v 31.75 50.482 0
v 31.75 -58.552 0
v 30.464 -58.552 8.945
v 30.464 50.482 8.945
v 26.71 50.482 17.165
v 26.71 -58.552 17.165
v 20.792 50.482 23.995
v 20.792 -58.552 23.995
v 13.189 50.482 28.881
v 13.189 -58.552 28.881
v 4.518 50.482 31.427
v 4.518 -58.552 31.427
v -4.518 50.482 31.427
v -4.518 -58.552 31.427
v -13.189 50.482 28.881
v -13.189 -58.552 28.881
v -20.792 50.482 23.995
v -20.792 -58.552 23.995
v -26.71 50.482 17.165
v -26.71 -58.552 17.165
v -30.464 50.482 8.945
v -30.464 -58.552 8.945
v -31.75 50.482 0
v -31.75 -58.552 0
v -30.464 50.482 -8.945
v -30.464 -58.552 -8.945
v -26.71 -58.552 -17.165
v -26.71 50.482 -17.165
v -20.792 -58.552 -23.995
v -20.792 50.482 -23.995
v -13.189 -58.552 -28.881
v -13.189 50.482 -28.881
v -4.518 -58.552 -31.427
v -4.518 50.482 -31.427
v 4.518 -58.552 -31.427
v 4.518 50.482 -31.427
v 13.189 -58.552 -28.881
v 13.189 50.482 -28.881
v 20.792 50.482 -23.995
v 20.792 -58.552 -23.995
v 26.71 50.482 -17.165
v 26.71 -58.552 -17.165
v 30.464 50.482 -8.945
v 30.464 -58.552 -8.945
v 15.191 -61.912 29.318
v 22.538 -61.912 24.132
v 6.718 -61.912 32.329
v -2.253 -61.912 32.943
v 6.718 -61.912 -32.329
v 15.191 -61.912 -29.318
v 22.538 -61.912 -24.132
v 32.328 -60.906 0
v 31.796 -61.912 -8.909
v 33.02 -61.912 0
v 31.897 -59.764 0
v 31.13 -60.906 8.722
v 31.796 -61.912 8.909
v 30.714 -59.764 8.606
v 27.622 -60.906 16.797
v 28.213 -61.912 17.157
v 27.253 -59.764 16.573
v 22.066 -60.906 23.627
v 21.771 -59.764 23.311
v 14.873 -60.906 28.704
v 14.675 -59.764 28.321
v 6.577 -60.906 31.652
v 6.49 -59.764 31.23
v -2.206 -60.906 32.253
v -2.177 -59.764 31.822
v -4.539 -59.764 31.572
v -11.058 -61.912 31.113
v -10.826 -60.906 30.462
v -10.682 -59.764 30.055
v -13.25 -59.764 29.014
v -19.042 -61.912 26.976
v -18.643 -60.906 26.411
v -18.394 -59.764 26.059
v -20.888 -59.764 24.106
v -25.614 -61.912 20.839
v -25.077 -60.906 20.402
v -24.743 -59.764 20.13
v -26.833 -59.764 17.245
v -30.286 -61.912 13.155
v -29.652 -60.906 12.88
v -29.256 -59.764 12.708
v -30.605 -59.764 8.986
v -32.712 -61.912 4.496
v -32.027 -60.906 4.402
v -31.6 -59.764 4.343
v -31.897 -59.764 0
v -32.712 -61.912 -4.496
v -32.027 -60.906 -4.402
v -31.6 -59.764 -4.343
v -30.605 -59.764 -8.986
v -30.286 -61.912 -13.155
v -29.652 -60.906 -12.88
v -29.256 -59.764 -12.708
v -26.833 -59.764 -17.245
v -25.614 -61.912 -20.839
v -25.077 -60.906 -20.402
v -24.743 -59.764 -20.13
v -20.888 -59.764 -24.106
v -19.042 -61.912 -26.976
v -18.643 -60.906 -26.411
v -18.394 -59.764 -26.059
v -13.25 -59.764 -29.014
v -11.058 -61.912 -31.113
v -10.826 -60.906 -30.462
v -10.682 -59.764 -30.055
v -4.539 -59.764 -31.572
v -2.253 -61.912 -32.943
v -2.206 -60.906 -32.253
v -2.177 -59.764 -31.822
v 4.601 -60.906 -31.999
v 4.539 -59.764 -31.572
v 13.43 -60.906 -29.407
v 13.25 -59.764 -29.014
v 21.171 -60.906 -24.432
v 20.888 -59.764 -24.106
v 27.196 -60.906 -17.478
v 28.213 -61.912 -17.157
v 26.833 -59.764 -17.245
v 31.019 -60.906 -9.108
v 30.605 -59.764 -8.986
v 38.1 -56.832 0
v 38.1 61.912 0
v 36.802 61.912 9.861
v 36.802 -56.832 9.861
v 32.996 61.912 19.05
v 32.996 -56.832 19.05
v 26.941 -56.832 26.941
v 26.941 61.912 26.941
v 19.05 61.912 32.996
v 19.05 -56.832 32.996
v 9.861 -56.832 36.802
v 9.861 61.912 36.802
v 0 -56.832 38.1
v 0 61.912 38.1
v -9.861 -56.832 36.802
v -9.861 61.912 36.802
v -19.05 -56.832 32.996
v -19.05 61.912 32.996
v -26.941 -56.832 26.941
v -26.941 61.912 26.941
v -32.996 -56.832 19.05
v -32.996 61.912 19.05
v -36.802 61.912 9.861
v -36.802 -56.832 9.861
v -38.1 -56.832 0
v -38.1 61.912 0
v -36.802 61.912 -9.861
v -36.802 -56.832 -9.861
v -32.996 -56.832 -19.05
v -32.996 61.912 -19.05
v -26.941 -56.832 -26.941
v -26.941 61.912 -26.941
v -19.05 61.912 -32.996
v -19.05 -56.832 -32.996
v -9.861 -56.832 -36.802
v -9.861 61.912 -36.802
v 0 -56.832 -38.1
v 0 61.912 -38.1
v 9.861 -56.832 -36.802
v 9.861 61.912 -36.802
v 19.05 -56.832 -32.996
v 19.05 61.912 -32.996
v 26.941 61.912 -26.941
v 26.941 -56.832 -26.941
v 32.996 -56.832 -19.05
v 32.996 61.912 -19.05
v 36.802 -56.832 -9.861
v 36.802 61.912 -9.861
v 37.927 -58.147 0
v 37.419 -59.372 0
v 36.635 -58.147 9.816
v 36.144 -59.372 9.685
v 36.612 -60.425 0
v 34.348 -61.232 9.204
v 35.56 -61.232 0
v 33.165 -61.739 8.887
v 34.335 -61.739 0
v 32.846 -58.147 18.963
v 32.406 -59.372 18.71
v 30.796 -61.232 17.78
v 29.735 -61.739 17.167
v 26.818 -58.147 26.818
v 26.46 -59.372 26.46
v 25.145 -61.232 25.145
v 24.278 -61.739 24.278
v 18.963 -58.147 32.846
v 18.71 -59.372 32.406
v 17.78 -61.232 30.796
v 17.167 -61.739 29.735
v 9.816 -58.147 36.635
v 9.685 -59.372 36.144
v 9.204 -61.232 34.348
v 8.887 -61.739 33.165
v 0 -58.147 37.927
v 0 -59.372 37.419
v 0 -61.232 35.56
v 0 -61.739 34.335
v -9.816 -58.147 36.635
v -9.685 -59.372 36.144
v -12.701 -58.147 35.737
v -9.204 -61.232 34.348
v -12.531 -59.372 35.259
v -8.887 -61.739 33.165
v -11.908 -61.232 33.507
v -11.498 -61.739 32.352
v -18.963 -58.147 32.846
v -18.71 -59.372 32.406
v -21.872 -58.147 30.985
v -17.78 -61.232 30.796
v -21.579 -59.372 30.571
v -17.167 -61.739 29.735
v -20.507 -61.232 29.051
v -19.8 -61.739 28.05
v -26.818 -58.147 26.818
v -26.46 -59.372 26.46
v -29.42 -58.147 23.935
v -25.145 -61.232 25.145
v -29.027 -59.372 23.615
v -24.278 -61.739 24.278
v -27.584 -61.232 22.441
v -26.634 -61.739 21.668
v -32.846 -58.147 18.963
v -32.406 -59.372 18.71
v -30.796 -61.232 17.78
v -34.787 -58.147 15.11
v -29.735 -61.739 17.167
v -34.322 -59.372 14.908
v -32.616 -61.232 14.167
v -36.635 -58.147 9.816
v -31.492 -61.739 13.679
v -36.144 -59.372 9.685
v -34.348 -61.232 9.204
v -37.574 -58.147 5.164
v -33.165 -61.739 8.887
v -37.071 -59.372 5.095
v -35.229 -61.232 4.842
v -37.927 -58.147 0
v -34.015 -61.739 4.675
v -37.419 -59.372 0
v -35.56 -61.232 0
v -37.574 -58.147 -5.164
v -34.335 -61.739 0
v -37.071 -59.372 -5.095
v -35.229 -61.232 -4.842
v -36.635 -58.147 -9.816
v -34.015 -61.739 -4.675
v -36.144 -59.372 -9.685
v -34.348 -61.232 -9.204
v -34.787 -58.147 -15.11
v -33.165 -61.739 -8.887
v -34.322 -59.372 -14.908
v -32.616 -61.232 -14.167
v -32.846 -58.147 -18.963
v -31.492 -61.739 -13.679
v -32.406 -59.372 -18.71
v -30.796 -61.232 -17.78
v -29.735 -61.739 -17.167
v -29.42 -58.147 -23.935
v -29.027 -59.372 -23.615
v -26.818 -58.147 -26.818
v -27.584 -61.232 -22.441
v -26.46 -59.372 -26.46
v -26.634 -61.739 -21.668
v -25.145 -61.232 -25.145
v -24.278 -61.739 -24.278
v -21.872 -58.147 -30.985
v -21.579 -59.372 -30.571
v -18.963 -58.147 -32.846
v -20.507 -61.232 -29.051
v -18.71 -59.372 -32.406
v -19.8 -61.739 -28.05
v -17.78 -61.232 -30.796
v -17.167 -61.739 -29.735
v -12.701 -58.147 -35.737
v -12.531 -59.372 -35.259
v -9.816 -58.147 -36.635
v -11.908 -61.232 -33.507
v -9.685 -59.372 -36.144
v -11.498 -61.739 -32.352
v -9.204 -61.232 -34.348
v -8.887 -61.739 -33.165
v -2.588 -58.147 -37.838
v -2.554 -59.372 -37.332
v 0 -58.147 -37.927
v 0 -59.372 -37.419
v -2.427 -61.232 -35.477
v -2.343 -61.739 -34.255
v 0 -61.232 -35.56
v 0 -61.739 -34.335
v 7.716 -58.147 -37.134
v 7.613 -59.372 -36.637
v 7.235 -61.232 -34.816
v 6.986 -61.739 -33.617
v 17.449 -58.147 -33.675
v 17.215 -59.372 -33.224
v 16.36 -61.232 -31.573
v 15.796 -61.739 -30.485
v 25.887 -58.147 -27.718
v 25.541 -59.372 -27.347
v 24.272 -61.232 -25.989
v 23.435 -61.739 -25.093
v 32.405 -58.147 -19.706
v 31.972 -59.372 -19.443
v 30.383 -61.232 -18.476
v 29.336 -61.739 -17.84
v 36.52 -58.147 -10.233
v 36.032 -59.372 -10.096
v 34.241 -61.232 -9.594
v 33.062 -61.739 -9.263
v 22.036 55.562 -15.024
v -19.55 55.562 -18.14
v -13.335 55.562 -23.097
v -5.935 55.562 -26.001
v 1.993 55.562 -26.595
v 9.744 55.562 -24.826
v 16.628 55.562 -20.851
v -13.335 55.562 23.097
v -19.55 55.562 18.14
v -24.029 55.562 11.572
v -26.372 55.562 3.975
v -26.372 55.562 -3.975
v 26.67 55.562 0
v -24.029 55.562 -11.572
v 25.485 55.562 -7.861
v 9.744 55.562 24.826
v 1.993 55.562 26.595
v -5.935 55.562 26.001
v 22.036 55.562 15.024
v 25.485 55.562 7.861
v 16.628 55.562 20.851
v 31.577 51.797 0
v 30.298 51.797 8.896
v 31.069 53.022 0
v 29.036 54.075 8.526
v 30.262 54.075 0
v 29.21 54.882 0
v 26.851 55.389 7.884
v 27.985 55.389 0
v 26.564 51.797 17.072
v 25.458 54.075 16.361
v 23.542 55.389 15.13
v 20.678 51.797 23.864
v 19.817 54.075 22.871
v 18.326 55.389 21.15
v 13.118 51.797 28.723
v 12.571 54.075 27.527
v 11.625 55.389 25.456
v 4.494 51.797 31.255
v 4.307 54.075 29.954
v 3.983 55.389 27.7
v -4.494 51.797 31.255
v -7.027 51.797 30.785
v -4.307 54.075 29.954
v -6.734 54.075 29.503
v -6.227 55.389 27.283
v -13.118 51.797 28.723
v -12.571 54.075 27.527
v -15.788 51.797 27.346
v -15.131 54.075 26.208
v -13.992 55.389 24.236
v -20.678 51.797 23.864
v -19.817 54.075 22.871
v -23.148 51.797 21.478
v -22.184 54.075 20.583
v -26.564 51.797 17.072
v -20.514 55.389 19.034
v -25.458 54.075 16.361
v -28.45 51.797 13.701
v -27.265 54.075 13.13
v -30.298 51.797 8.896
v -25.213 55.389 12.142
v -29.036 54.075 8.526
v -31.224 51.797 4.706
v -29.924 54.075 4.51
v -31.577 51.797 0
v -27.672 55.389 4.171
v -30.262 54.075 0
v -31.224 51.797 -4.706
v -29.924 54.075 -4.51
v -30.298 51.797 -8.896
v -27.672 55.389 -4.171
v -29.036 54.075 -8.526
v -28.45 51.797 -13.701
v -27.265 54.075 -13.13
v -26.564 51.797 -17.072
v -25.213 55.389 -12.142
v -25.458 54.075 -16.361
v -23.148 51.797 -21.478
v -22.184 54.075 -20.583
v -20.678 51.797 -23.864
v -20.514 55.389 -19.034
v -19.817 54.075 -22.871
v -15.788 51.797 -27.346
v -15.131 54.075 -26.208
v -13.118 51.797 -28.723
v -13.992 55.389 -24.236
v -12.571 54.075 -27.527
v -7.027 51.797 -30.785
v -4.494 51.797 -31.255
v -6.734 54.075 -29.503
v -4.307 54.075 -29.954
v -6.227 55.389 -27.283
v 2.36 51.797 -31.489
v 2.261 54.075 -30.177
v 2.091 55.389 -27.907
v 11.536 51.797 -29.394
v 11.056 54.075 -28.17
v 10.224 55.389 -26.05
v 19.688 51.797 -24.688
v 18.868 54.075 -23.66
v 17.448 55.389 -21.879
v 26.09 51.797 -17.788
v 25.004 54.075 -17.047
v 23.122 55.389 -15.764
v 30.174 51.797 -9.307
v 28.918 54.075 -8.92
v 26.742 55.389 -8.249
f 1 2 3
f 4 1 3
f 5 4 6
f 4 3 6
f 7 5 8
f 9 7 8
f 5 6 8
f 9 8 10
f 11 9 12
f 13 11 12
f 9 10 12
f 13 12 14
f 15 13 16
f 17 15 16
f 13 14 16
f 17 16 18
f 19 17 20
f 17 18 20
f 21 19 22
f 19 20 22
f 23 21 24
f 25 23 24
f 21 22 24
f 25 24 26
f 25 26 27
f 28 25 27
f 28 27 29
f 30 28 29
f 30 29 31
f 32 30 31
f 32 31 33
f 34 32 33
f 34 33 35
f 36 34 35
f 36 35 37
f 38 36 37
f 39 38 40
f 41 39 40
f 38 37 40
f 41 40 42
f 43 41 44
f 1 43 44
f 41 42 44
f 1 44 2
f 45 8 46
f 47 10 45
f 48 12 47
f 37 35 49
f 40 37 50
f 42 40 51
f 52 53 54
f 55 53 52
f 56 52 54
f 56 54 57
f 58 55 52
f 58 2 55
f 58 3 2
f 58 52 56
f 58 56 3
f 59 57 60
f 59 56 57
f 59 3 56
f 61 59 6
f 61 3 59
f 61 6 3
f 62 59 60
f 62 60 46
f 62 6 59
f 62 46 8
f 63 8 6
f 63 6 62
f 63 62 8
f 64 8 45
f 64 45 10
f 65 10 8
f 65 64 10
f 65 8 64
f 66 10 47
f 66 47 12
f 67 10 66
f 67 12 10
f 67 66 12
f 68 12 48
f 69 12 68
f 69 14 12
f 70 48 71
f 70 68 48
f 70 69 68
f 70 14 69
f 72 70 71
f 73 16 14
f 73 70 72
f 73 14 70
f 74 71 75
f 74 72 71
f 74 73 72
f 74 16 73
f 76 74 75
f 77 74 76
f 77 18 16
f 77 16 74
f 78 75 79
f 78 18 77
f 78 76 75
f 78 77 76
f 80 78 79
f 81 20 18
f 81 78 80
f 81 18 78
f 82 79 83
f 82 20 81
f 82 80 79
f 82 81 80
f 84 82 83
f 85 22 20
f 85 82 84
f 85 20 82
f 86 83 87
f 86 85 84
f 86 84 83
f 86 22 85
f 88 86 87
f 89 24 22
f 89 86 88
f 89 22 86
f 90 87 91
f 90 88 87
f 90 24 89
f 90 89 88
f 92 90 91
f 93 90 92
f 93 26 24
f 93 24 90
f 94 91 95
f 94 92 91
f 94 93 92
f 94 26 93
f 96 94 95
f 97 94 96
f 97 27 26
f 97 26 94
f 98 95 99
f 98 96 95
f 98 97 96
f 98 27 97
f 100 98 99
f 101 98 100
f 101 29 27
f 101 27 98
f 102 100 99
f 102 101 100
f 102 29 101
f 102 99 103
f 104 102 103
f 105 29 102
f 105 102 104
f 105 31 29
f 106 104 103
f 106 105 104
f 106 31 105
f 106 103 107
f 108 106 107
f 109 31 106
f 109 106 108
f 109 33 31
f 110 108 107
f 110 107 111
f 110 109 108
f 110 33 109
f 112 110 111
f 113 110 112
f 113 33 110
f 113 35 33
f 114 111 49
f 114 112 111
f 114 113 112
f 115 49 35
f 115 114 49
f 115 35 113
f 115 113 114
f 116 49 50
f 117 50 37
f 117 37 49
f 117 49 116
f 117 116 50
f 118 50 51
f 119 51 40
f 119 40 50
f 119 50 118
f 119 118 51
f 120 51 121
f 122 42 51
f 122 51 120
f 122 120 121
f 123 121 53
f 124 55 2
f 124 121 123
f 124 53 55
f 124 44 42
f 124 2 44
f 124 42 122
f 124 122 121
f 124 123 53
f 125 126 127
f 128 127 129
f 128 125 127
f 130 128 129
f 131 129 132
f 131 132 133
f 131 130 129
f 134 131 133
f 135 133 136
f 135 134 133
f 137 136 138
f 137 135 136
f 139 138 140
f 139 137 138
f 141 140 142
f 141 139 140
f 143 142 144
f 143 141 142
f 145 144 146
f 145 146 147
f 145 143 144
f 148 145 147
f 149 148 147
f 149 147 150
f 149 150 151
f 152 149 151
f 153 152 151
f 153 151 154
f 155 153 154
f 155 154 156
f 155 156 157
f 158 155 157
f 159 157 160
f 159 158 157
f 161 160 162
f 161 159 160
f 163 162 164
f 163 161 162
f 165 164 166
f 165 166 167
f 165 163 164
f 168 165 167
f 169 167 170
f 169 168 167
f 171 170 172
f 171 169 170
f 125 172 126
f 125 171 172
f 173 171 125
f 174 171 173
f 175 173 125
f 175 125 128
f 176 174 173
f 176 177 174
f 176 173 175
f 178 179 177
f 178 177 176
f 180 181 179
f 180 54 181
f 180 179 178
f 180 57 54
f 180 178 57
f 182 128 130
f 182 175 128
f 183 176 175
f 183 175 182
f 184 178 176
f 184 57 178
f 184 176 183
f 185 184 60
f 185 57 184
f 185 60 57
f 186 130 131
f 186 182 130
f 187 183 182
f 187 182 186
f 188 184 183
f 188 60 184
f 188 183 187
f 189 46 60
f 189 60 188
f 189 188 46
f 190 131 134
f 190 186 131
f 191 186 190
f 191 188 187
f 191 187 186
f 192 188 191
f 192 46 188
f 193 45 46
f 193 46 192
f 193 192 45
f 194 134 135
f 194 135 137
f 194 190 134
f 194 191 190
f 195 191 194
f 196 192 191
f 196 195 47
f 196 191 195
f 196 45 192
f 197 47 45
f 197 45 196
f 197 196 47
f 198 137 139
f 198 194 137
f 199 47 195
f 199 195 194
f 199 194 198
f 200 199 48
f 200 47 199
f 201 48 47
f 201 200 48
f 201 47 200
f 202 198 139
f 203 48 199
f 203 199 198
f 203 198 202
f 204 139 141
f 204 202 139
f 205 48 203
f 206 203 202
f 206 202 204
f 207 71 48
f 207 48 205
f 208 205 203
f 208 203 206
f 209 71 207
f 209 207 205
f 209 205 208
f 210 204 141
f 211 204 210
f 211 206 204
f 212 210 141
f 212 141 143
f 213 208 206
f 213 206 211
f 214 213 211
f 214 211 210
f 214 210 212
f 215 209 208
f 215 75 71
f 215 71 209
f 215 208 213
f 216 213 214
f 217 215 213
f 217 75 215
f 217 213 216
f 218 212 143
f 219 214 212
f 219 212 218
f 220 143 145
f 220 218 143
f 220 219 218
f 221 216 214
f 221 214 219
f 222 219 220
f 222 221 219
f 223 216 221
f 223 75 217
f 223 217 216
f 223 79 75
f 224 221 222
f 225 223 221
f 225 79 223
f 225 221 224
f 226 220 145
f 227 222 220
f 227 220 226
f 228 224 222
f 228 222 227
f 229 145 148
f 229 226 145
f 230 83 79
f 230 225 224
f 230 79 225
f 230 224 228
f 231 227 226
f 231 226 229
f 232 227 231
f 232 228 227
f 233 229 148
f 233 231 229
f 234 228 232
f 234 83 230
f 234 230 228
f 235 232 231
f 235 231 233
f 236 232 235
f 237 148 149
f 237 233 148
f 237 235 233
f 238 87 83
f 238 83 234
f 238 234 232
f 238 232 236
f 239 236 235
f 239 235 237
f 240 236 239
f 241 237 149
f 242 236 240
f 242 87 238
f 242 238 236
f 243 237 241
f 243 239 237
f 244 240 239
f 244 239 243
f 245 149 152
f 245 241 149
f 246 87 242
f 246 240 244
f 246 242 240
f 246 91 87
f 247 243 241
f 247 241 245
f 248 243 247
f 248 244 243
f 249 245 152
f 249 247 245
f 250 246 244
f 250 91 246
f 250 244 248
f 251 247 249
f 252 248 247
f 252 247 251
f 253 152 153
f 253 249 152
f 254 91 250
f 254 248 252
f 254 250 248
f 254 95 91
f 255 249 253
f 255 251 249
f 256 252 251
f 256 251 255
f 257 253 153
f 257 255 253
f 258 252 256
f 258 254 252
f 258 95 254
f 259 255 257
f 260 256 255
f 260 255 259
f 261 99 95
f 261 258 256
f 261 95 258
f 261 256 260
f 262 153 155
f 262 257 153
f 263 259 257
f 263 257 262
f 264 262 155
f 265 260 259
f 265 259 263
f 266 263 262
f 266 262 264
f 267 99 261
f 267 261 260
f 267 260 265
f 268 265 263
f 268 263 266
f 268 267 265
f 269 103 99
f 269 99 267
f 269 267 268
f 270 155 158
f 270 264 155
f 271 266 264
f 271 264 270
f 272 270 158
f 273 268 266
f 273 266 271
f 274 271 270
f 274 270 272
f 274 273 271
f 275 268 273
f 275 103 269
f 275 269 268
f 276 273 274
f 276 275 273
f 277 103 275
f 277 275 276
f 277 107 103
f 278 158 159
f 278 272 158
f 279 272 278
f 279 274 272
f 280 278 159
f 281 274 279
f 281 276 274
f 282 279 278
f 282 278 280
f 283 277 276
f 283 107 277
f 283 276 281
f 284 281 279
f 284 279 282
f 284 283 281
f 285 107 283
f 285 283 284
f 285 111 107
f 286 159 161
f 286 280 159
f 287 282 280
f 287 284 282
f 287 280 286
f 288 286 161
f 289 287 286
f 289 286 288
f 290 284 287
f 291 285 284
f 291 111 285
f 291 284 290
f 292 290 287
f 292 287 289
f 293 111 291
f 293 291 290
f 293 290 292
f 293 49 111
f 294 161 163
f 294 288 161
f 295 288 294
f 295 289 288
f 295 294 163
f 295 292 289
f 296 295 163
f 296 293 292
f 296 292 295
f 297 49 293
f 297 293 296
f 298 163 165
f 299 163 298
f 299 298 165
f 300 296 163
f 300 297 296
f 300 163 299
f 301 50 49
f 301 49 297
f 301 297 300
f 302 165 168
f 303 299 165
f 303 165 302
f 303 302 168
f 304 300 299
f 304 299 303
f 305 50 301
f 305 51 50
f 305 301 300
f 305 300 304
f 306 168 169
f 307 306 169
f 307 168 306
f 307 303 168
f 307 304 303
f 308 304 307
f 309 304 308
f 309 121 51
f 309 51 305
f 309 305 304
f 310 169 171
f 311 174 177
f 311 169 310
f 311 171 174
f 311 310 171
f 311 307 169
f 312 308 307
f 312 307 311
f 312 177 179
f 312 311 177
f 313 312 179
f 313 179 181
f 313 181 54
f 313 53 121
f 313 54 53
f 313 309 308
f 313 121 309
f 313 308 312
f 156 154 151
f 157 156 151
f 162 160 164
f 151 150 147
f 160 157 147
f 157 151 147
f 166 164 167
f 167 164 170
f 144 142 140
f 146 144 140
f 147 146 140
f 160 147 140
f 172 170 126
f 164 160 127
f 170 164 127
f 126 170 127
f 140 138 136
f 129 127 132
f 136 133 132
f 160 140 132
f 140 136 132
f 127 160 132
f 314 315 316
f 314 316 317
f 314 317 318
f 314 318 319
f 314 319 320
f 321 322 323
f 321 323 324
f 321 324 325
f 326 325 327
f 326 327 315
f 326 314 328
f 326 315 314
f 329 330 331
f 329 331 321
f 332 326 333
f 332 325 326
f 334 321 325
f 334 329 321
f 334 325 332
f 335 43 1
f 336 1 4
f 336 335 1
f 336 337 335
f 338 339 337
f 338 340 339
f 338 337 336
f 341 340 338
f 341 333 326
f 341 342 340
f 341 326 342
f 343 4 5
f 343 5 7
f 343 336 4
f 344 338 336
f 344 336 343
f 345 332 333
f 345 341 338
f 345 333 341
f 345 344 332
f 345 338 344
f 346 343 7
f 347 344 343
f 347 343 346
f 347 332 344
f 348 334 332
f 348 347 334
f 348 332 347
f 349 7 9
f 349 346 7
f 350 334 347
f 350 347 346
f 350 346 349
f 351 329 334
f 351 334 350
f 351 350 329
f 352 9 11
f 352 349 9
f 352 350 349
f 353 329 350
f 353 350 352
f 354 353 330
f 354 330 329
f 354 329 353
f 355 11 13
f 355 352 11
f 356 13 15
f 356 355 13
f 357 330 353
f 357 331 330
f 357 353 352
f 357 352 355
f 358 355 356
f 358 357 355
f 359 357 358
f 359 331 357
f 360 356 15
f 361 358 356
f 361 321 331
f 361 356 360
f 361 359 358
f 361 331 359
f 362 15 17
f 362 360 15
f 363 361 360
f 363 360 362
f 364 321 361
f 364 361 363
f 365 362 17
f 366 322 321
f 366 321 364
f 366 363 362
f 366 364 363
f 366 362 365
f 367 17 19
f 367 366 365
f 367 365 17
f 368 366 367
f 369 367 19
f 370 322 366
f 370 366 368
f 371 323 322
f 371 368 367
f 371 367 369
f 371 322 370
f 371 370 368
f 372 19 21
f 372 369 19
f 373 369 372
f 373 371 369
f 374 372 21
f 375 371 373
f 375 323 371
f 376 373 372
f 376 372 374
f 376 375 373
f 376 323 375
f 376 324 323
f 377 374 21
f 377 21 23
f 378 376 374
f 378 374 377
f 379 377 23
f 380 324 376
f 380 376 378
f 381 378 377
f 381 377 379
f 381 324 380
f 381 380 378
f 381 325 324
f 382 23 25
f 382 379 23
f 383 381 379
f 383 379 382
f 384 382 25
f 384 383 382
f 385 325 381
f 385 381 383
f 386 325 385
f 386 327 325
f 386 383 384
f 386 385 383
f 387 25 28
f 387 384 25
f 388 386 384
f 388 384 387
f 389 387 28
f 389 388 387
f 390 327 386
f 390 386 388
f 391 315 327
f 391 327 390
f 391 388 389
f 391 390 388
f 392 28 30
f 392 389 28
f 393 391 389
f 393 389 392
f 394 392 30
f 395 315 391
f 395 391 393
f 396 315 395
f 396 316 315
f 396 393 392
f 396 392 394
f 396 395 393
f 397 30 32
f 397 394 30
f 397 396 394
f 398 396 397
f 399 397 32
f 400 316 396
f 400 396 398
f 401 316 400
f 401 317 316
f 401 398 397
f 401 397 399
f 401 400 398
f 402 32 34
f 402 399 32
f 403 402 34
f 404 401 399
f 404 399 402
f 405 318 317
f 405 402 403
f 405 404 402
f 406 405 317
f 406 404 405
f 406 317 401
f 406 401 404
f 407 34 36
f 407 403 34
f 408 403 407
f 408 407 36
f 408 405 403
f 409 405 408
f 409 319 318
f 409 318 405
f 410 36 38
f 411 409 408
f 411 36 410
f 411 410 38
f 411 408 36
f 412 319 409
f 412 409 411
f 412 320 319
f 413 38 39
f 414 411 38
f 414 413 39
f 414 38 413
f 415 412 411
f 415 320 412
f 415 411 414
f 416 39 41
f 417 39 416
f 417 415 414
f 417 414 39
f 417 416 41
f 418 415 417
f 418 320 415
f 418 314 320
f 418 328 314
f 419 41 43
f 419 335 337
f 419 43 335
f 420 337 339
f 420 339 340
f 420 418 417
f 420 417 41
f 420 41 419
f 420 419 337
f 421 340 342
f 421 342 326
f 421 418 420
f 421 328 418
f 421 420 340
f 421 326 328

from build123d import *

# Parameters (mm, degrees)
F0_R     = 38.1
F1_DEPTH = 61.9125
F3_T     = -6.35


# Not quite as in the source:
# - a fillet or chamfer that OpenCascade refuses, or shapes differently, is made with other operations: its cross-section is extruded or revolved along the edge and cut away or added
# - a feature of the source that left no trace in its solid (it failed there, or was rolled back) is left out


with BuildPart() as f1:
    # F0 (on Front) → F1 (new body, symmetric)
    with BuildSketch(Plane.XZ):
        Circle(F0_R)
    extrude(amount=F1_DEPTH, both=True)

    # F3
    f3_openings = [f1.faces().sort_by_distance(p)[0] for p in [
        (0, -61.9125, 0),
    ]]
    offset(amount=F3_T, openings=f3_openings)

    # F4: fillet of radius 5.08 on 4 edges, made by hand

    # F4_s1 → F4_t2 (revolve)
    with BuildSketch(Plane.XY):
        with BuildLine():
            ThreePointArc((31.75, 50.4825), (30.2621024484, 54.0746024484), (26.67, 55.5625))
            Line((26.67, 55.5625), (31.75, 55.5625))
            Line((31.75, 55.5625), (31.75, 50.4825))
        make_face()
    revolve(axis=Axis((0, 55.5625, 0), (0, -1, 0)))

    # F4_s3 → F4_t4 (revolve, cut)
    with BuildSketch(Plane.XY):
        with BuildLine():
            ThreePointArc((38.1, -56.8325), (36.6121024484, -60.4246024484), (33.02, -61.9125))
            Line((33.02, -61.9125), (38.1, -61.9125))
            Line((38.1, -61.9125), (38.1, -56.8325))
        make_face()
    revolve(axis=Axis((0, -61.9125, 0), (0, -1, 0)), mode=Mode.SUBTRACT)

    # F4_s5 → F4_t6 (revolve, cut)
    with BuildSketch(Plane.XY):
        with BuildLine():
            ThreePointArc((33.02, -61.9125), (32.0780951188, -60.3484470592), (31.75, -58.5523958349))
            Line((31.75, -58.5523958349), (31.75, -61.9125))
            Line((31.75, -61.9125), (33.02, -61.9125))
        make_face()
    revolve(axis=Axis((0, -61.9125, 0), (0, -1, 0)), mode=Mode.SUBTRACT)


solid = f1.part
